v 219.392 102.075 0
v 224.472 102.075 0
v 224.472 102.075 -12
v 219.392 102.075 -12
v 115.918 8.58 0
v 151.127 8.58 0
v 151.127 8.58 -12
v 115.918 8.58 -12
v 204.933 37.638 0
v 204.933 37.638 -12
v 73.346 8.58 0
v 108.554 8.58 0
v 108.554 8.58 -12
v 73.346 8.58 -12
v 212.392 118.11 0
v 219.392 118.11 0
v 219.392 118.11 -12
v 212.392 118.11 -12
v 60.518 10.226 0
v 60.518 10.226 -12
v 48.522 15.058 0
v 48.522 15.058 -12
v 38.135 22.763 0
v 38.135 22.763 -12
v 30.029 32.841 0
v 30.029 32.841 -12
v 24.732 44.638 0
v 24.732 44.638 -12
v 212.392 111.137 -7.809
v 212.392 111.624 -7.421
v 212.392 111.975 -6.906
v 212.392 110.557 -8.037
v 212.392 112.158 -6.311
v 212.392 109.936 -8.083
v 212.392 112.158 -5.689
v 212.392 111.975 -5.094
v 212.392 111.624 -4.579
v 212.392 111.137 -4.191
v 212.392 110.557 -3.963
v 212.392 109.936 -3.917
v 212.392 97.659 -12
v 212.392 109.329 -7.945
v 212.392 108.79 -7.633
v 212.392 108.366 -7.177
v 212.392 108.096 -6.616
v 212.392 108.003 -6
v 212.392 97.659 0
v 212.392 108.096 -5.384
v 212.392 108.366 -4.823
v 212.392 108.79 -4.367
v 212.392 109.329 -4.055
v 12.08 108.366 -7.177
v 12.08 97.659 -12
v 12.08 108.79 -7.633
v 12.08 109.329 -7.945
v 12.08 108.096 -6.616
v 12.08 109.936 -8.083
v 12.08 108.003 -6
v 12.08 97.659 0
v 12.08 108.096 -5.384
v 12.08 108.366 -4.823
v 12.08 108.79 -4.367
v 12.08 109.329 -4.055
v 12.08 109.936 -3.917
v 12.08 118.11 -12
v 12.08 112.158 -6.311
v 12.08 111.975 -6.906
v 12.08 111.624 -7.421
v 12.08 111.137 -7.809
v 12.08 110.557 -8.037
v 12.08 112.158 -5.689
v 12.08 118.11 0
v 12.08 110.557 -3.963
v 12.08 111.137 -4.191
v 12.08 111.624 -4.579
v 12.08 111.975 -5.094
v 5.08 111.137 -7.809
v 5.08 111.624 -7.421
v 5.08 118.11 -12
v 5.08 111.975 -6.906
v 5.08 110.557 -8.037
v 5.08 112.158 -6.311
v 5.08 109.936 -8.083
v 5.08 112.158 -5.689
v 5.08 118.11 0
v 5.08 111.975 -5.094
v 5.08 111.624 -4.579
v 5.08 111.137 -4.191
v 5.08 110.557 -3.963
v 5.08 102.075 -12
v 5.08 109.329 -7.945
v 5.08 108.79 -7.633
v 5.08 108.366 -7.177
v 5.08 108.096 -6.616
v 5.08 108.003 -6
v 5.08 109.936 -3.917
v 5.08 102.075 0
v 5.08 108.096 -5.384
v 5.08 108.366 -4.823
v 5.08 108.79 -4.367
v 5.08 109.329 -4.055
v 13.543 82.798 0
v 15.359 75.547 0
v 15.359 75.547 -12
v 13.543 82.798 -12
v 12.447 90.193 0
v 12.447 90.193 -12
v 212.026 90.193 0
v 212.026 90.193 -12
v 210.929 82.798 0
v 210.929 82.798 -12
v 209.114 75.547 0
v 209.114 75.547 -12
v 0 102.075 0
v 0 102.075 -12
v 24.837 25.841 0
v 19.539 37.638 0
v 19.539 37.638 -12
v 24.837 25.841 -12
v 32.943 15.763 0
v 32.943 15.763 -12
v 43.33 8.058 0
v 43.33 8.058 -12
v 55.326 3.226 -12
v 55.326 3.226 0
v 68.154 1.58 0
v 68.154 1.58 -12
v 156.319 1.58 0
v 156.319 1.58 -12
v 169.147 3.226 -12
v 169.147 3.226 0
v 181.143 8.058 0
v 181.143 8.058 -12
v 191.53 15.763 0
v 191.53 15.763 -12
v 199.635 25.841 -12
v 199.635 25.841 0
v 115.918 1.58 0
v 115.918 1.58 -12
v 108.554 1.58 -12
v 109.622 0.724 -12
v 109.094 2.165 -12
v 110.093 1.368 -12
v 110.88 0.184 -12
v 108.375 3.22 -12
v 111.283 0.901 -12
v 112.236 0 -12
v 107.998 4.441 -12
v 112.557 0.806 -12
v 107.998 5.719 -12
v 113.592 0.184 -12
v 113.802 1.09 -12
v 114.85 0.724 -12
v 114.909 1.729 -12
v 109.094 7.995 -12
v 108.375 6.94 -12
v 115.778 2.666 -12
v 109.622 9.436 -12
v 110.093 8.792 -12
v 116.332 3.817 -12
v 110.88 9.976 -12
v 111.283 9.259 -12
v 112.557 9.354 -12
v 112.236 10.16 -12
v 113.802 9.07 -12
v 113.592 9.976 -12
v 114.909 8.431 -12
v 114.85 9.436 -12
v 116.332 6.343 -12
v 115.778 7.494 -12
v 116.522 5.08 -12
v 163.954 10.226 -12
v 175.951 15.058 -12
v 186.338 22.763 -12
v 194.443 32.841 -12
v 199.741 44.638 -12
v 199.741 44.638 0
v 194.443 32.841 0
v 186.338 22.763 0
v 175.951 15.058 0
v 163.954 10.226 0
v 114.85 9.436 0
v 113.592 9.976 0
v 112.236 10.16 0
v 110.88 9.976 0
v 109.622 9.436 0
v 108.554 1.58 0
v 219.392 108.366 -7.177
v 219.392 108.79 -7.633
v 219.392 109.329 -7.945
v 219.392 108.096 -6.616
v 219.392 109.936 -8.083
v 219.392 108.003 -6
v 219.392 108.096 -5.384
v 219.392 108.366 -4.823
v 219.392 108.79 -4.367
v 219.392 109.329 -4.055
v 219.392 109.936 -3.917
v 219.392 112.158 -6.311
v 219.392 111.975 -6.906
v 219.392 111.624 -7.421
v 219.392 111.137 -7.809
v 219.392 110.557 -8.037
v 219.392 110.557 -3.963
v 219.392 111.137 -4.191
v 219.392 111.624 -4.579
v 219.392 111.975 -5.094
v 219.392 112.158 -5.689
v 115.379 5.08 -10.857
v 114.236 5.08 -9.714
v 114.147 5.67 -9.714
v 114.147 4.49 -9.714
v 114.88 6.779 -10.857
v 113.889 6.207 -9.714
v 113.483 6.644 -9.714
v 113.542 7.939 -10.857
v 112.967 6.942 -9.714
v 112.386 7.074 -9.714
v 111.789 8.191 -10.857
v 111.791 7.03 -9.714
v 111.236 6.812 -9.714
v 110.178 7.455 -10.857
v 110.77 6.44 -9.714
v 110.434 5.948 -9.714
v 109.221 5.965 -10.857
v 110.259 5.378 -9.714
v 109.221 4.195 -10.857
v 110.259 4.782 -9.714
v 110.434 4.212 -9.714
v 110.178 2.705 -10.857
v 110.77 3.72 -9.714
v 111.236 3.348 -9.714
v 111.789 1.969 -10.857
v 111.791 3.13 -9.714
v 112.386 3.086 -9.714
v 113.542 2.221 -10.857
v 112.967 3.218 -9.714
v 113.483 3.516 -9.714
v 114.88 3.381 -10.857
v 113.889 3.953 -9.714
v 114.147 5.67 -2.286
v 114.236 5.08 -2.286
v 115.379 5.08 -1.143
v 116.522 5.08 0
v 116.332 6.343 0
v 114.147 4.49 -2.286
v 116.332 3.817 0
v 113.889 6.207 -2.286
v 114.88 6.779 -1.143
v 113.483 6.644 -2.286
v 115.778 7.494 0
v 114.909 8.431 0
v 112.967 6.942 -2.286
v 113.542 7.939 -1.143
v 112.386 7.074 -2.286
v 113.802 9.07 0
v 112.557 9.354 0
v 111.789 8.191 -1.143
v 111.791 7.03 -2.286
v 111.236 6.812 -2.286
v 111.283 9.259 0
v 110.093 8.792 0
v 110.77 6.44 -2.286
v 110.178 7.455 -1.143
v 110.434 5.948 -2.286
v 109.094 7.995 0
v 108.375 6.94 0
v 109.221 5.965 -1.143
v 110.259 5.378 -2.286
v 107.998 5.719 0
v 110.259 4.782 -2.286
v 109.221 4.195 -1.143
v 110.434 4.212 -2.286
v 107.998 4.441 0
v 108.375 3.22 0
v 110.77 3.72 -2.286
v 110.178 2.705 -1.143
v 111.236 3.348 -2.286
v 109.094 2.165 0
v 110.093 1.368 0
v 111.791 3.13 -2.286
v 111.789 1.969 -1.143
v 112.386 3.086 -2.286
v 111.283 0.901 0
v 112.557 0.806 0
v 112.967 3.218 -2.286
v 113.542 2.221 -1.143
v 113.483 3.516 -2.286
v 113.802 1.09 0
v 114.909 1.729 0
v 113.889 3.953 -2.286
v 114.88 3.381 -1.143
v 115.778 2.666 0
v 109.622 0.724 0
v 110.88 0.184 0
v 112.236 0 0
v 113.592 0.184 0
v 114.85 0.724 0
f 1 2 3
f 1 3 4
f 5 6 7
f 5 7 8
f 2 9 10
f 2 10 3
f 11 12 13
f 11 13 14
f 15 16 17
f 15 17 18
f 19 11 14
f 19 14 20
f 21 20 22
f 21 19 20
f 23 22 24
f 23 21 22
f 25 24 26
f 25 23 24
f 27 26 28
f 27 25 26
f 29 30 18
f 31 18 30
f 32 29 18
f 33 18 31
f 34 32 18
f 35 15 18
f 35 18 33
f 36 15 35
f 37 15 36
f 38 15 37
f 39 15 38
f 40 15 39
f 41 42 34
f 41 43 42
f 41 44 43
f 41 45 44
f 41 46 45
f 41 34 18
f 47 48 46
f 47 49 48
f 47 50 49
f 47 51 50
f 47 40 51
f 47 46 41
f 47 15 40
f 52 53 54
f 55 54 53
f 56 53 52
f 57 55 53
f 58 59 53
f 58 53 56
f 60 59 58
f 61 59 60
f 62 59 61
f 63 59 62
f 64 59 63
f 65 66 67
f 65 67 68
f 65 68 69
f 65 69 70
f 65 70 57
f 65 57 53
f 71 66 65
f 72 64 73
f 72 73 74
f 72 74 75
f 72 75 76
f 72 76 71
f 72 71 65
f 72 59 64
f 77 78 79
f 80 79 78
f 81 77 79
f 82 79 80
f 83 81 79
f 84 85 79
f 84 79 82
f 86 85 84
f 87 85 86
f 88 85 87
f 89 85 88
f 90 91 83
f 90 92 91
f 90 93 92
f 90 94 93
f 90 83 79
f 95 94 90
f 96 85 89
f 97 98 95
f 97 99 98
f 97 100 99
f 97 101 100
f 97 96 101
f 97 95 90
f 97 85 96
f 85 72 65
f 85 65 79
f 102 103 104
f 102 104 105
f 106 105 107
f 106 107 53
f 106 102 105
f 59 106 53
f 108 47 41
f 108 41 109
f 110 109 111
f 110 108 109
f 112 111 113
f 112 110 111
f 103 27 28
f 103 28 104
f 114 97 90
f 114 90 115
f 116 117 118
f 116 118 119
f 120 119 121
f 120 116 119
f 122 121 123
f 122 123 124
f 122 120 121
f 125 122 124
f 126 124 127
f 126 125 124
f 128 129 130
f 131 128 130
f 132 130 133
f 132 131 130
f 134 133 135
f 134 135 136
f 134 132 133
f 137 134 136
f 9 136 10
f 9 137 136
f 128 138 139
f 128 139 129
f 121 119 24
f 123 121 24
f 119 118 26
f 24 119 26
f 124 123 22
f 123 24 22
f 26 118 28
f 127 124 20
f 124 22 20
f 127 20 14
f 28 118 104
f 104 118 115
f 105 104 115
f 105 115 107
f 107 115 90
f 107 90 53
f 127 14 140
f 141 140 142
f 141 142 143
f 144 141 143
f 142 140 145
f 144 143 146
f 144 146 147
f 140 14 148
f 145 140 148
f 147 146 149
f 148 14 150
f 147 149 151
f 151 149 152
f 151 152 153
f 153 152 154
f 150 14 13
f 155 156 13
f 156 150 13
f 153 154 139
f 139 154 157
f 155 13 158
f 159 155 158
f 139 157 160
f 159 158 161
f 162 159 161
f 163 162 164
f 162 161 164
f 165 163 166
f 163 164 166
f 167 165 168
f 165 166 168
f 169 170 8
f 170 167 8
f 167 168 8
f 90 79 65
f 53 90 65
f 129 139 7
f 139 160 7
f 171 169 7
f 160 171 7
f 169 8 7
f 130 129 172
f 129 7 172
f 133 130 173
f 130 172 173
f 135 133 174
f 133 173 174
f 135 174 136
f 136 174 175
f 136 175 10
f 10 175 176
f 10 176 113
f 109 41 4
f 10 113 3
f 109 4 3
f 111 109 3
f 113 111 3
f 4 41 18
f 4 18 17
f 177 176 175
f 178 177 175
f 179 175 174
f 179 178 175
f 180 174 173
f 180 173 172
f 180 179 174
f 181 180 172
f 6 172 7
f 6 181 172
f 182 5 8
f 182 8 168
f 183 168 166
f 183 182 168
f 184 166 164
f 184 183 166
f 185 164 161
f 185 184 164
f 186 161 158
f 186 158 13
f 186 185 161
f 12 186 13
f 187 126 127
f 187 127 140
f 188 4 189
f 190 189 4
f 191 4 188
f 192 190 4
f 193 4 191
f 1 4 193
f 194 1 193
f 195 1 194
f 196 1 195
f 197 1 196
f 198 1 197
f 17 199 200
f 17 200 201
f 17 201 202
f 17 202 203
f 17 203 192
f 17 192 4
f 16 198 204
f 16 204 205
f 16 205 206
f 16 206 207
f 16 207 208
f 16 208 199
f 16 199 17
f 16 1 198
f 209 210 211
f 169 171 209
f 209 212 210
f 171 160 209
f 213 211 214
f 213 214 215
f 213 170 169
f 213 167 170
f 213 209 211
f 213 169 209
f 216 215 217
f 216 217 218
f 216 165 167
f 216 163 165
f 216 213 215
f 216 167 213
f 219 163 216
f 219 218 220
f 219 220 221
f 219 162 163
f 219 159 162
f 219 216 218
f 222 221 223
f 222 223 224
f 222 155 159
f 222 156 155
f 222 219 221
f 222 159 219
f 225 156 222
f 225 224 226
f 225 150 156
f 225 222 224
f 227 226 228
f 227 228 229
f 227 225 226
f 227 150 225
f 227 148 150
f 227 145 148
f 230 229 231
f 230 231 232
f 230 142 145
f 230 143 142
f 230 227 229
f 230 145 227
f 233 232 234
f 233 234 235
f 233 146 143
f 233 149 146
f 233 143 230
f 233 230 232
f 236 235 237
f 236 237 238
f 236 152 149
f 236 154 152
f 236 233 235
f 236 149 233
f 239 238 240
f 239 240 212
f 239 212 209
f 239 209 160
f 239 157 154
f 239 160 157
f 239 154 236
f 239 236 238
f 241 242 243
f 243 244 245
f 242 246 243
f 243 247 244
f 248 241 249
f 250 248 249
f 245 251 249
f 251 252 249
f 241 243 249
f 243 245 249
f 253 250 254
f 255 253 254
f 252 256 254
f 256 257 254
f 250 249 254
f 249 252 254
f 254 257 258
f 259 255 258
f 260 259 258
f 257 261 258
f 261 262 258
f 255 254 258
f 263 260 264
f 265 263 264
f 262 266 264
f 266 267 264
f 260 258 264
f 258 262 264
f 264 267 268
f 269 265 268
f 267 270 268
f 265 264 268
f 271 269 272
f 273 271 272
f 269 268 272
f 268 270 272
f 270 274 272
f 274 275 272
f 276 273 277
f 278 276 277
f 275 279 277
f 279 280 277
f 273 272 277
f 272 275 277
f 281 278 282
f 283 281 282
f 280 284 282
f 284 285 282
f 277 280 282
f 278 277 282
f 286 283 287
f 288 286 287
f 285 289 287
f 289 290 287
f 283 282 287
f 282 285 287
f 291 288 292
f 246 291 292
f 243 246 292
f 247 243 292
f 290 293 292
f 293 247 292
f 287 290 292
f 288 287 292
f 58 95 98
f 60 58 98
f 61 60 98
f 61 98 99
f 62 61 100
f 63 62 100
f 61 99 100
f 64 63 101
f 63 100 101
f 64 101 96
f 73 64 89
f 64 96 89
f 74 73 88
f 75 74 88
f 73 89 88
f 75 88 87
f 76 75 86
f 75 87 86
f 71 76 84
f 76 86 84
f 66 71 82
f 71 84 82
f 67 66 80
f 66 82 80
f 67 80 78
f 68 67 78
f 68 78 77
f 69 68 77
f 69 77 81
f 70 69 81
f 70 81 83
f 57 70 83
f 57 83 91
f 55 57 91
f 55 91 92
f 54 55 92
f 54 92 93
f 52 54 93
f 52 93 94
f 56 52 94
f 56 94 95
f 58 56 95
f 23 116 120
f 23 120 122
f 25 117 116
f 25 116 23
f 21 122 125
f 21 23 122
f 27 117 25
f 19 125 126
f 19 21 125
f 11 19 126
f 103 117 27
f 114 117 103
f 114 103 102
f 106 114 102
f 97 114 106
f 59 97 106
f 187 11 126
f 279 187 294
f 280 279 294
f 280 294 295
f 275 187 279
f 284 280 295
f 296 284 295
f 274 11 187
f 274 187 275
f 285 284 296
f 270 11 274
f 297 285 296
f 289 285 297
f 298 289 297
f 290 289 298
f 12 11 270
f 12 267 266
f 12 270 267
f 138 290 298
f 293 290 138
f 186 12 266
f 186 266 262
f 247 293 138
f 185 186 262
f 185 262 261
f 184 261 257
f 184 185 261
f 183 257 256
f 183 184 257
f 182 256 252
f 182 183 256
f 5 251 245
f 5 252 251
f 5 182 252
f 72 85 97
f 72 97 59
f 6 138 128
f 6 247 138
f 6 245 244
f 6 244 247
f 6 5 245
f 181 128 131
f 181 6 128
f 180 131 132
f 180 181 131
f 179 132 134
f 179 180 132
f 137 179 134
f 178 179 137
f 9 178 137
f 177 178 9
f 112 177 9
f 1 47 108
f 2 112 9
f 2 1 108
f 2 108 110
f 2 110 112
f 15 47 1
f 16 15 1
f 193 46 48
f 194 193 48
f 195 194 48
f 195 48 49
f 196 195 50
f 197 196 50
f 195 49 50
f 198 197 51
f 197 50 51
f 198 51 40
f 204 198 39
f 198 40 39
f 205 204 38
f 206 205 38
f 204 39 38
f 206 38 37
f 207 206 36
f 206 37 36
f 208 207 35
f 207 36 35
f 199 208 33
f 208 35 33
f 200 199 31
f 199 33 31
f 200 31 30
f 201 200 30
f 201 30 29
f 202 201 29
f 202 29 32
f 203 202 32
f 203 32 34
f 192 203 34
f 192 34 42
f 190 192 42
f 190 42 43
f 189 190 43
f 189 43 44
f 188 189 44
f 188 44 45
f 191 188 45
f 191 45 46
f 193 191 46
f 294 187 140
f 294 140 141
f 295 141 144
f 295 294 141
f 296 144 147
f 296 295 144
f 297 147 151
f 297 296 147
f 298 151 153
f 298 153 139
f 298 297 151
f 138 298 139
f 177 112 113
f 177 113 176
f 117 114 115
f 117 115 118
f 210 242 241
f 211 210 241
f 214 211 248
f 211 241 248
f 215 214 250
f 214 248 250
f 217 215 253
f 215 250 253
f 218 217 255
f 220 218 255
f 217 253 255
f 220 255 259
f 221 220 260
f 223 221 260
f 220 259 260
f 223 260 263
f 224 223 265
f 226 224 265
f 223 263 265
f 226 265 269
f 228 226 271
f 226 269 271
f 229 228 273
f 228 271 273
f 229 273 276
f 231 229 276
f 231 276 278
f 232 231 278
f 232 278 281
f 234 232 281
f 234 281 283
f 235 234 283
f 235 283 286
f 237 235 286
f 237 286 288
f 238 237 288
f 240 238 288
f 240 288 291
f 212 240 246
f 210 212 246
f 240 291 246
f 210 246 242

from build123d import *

# Parameters (mm, degrees)
F0_R     = 2
F1_DEPTH = 12
F2_SIZE  = 2.286
F3_SIZE  = 2.286
F4_R     = 2.08915
F5_DEPTH = 219.3935


with BuildPart() as f1:
    # F0 (on Top) → F1 (new body)
    with BuildSketch(Plane.XY):
        with BuildLine():
            Line((12.08, 118.11), (5.08, 118.11))
            Line((5.08, 118.11), (5.08, 102.074511))
            Line((5.08, 102.074511), (0, 102.074511))
            Line((0, 102.074511), (19.539499, 37.638369))
            ThreePointArc((19.539499, 37.638369), (37.889981, 11.578561), (68.153533, 1.58))
            Line((68.153533, 1.58), (108.554348, 1.58))
            ThreePointArc((108.554348, 1.58), (107.15625, 5.08), (108.554348, 8.58))
            Line((108.554348, 8.58), (73.345626, 8.58))
            ThreePointArc((73.345626, 8.58), (43.082074, 18.578561), (24.731592, 44.638369))
            Line((24.731592, 44.638369), (15.358949, 75.546886))
            ThreePointArc((15.358949, 75.546886), (12.904195, 86.482216), (12.08, 97.659333))
            Line((12.08, 97.659333), (12.08, 118.11))
        make_face()
        with BuildLine():
            ThreePointArc((108.554348, 8.58), (107.15625, 5.08), (108.554348, 1.58))
            ThreePointArc((108.554348, 1.58), (112.23625, 0), (115.918152, 1.58))
            ThreePointArc((115.918152, 1.58), (116.953795, 3.195545), (117.31625, 5.08))
            ThreePointArc((117.31625, 5.08), (116.953795, 6.964455), (115.918152, 8.58))
            ThreePointArc((115.918152, 8.58), (112.23625, 10.16), (108.554348, 8.58))
        make_face()
        with Locations((112.23625, 5.08)):
            Circle(F0_R, mode=Mode.SUBTRACT)
        with BuildLine():
            ThreePointArc((117.31625, 5.08), (116.953795, 3.195545), (115.918152, 1.58))
            Line((115.918152, 1.58), (156.318967, 1.58))
            ThreePointArc((156.318967, 1.58), (186.582519, 11.578561), (204.933001, 37.638369))
            Line((204.933001, 37.638369), (224.4725, 102.074511))
            Line((224.4725, 102.074511), (219.3925, 102.074511))
            Line((219.3925, 102.074511), (219.3925, 118.11))
            Line((219.3925, 118.11), (212.3925, 118.11))
            Line((212.3925, 118.11), (212.3925, 97.659333))
            ThreePointArc((212.3925, 97.659333), (211.568305, 86.482216), (209.113551, 75.546886))
            Line((209.113551, 75.546886), (199.740908, 44.638369))
            ThreePointArc((199.740908, 44.638369), (181.390426, 18.578561), (151.126874, 8.58))
            Line((151.126874, 8.58), (115.918152, 8.58))
            ThreePointArc((115.918152, 8.58), (116.953795, 6.964455), (117.31625, 5.08))
        make_face()
    extrude(amount=-F1_DEPTH)

    # F2
    f2_edges = [f1.edges().sort_by_distance(p)[0] for p in [
        (110.23625, 5.08, 0),
    ]]
    chamfer(f2_edges, length=F2_SIZE)

    # F3
    f3_edges = [f1.edges().sort_by_distance(p)[0] for p in [
        (110.23625, 5.08, -12),
    ]]
    chamfer(f3_edges, length=F3_SIZE)

    # F4 (on face) → F5 (cut, through all)
    with BuildSketch(Plane(origin=(5.08, 0, 0), x_dir=(0, -1, 0), z_dir=(-1, 0, 0))):
        with Locations((-110.092256, -6)):
            Circle(F4_R)
    extrude(amount=-F5_DEPTH, mode=Mode.SUBTRACT)


solid = f1.part
